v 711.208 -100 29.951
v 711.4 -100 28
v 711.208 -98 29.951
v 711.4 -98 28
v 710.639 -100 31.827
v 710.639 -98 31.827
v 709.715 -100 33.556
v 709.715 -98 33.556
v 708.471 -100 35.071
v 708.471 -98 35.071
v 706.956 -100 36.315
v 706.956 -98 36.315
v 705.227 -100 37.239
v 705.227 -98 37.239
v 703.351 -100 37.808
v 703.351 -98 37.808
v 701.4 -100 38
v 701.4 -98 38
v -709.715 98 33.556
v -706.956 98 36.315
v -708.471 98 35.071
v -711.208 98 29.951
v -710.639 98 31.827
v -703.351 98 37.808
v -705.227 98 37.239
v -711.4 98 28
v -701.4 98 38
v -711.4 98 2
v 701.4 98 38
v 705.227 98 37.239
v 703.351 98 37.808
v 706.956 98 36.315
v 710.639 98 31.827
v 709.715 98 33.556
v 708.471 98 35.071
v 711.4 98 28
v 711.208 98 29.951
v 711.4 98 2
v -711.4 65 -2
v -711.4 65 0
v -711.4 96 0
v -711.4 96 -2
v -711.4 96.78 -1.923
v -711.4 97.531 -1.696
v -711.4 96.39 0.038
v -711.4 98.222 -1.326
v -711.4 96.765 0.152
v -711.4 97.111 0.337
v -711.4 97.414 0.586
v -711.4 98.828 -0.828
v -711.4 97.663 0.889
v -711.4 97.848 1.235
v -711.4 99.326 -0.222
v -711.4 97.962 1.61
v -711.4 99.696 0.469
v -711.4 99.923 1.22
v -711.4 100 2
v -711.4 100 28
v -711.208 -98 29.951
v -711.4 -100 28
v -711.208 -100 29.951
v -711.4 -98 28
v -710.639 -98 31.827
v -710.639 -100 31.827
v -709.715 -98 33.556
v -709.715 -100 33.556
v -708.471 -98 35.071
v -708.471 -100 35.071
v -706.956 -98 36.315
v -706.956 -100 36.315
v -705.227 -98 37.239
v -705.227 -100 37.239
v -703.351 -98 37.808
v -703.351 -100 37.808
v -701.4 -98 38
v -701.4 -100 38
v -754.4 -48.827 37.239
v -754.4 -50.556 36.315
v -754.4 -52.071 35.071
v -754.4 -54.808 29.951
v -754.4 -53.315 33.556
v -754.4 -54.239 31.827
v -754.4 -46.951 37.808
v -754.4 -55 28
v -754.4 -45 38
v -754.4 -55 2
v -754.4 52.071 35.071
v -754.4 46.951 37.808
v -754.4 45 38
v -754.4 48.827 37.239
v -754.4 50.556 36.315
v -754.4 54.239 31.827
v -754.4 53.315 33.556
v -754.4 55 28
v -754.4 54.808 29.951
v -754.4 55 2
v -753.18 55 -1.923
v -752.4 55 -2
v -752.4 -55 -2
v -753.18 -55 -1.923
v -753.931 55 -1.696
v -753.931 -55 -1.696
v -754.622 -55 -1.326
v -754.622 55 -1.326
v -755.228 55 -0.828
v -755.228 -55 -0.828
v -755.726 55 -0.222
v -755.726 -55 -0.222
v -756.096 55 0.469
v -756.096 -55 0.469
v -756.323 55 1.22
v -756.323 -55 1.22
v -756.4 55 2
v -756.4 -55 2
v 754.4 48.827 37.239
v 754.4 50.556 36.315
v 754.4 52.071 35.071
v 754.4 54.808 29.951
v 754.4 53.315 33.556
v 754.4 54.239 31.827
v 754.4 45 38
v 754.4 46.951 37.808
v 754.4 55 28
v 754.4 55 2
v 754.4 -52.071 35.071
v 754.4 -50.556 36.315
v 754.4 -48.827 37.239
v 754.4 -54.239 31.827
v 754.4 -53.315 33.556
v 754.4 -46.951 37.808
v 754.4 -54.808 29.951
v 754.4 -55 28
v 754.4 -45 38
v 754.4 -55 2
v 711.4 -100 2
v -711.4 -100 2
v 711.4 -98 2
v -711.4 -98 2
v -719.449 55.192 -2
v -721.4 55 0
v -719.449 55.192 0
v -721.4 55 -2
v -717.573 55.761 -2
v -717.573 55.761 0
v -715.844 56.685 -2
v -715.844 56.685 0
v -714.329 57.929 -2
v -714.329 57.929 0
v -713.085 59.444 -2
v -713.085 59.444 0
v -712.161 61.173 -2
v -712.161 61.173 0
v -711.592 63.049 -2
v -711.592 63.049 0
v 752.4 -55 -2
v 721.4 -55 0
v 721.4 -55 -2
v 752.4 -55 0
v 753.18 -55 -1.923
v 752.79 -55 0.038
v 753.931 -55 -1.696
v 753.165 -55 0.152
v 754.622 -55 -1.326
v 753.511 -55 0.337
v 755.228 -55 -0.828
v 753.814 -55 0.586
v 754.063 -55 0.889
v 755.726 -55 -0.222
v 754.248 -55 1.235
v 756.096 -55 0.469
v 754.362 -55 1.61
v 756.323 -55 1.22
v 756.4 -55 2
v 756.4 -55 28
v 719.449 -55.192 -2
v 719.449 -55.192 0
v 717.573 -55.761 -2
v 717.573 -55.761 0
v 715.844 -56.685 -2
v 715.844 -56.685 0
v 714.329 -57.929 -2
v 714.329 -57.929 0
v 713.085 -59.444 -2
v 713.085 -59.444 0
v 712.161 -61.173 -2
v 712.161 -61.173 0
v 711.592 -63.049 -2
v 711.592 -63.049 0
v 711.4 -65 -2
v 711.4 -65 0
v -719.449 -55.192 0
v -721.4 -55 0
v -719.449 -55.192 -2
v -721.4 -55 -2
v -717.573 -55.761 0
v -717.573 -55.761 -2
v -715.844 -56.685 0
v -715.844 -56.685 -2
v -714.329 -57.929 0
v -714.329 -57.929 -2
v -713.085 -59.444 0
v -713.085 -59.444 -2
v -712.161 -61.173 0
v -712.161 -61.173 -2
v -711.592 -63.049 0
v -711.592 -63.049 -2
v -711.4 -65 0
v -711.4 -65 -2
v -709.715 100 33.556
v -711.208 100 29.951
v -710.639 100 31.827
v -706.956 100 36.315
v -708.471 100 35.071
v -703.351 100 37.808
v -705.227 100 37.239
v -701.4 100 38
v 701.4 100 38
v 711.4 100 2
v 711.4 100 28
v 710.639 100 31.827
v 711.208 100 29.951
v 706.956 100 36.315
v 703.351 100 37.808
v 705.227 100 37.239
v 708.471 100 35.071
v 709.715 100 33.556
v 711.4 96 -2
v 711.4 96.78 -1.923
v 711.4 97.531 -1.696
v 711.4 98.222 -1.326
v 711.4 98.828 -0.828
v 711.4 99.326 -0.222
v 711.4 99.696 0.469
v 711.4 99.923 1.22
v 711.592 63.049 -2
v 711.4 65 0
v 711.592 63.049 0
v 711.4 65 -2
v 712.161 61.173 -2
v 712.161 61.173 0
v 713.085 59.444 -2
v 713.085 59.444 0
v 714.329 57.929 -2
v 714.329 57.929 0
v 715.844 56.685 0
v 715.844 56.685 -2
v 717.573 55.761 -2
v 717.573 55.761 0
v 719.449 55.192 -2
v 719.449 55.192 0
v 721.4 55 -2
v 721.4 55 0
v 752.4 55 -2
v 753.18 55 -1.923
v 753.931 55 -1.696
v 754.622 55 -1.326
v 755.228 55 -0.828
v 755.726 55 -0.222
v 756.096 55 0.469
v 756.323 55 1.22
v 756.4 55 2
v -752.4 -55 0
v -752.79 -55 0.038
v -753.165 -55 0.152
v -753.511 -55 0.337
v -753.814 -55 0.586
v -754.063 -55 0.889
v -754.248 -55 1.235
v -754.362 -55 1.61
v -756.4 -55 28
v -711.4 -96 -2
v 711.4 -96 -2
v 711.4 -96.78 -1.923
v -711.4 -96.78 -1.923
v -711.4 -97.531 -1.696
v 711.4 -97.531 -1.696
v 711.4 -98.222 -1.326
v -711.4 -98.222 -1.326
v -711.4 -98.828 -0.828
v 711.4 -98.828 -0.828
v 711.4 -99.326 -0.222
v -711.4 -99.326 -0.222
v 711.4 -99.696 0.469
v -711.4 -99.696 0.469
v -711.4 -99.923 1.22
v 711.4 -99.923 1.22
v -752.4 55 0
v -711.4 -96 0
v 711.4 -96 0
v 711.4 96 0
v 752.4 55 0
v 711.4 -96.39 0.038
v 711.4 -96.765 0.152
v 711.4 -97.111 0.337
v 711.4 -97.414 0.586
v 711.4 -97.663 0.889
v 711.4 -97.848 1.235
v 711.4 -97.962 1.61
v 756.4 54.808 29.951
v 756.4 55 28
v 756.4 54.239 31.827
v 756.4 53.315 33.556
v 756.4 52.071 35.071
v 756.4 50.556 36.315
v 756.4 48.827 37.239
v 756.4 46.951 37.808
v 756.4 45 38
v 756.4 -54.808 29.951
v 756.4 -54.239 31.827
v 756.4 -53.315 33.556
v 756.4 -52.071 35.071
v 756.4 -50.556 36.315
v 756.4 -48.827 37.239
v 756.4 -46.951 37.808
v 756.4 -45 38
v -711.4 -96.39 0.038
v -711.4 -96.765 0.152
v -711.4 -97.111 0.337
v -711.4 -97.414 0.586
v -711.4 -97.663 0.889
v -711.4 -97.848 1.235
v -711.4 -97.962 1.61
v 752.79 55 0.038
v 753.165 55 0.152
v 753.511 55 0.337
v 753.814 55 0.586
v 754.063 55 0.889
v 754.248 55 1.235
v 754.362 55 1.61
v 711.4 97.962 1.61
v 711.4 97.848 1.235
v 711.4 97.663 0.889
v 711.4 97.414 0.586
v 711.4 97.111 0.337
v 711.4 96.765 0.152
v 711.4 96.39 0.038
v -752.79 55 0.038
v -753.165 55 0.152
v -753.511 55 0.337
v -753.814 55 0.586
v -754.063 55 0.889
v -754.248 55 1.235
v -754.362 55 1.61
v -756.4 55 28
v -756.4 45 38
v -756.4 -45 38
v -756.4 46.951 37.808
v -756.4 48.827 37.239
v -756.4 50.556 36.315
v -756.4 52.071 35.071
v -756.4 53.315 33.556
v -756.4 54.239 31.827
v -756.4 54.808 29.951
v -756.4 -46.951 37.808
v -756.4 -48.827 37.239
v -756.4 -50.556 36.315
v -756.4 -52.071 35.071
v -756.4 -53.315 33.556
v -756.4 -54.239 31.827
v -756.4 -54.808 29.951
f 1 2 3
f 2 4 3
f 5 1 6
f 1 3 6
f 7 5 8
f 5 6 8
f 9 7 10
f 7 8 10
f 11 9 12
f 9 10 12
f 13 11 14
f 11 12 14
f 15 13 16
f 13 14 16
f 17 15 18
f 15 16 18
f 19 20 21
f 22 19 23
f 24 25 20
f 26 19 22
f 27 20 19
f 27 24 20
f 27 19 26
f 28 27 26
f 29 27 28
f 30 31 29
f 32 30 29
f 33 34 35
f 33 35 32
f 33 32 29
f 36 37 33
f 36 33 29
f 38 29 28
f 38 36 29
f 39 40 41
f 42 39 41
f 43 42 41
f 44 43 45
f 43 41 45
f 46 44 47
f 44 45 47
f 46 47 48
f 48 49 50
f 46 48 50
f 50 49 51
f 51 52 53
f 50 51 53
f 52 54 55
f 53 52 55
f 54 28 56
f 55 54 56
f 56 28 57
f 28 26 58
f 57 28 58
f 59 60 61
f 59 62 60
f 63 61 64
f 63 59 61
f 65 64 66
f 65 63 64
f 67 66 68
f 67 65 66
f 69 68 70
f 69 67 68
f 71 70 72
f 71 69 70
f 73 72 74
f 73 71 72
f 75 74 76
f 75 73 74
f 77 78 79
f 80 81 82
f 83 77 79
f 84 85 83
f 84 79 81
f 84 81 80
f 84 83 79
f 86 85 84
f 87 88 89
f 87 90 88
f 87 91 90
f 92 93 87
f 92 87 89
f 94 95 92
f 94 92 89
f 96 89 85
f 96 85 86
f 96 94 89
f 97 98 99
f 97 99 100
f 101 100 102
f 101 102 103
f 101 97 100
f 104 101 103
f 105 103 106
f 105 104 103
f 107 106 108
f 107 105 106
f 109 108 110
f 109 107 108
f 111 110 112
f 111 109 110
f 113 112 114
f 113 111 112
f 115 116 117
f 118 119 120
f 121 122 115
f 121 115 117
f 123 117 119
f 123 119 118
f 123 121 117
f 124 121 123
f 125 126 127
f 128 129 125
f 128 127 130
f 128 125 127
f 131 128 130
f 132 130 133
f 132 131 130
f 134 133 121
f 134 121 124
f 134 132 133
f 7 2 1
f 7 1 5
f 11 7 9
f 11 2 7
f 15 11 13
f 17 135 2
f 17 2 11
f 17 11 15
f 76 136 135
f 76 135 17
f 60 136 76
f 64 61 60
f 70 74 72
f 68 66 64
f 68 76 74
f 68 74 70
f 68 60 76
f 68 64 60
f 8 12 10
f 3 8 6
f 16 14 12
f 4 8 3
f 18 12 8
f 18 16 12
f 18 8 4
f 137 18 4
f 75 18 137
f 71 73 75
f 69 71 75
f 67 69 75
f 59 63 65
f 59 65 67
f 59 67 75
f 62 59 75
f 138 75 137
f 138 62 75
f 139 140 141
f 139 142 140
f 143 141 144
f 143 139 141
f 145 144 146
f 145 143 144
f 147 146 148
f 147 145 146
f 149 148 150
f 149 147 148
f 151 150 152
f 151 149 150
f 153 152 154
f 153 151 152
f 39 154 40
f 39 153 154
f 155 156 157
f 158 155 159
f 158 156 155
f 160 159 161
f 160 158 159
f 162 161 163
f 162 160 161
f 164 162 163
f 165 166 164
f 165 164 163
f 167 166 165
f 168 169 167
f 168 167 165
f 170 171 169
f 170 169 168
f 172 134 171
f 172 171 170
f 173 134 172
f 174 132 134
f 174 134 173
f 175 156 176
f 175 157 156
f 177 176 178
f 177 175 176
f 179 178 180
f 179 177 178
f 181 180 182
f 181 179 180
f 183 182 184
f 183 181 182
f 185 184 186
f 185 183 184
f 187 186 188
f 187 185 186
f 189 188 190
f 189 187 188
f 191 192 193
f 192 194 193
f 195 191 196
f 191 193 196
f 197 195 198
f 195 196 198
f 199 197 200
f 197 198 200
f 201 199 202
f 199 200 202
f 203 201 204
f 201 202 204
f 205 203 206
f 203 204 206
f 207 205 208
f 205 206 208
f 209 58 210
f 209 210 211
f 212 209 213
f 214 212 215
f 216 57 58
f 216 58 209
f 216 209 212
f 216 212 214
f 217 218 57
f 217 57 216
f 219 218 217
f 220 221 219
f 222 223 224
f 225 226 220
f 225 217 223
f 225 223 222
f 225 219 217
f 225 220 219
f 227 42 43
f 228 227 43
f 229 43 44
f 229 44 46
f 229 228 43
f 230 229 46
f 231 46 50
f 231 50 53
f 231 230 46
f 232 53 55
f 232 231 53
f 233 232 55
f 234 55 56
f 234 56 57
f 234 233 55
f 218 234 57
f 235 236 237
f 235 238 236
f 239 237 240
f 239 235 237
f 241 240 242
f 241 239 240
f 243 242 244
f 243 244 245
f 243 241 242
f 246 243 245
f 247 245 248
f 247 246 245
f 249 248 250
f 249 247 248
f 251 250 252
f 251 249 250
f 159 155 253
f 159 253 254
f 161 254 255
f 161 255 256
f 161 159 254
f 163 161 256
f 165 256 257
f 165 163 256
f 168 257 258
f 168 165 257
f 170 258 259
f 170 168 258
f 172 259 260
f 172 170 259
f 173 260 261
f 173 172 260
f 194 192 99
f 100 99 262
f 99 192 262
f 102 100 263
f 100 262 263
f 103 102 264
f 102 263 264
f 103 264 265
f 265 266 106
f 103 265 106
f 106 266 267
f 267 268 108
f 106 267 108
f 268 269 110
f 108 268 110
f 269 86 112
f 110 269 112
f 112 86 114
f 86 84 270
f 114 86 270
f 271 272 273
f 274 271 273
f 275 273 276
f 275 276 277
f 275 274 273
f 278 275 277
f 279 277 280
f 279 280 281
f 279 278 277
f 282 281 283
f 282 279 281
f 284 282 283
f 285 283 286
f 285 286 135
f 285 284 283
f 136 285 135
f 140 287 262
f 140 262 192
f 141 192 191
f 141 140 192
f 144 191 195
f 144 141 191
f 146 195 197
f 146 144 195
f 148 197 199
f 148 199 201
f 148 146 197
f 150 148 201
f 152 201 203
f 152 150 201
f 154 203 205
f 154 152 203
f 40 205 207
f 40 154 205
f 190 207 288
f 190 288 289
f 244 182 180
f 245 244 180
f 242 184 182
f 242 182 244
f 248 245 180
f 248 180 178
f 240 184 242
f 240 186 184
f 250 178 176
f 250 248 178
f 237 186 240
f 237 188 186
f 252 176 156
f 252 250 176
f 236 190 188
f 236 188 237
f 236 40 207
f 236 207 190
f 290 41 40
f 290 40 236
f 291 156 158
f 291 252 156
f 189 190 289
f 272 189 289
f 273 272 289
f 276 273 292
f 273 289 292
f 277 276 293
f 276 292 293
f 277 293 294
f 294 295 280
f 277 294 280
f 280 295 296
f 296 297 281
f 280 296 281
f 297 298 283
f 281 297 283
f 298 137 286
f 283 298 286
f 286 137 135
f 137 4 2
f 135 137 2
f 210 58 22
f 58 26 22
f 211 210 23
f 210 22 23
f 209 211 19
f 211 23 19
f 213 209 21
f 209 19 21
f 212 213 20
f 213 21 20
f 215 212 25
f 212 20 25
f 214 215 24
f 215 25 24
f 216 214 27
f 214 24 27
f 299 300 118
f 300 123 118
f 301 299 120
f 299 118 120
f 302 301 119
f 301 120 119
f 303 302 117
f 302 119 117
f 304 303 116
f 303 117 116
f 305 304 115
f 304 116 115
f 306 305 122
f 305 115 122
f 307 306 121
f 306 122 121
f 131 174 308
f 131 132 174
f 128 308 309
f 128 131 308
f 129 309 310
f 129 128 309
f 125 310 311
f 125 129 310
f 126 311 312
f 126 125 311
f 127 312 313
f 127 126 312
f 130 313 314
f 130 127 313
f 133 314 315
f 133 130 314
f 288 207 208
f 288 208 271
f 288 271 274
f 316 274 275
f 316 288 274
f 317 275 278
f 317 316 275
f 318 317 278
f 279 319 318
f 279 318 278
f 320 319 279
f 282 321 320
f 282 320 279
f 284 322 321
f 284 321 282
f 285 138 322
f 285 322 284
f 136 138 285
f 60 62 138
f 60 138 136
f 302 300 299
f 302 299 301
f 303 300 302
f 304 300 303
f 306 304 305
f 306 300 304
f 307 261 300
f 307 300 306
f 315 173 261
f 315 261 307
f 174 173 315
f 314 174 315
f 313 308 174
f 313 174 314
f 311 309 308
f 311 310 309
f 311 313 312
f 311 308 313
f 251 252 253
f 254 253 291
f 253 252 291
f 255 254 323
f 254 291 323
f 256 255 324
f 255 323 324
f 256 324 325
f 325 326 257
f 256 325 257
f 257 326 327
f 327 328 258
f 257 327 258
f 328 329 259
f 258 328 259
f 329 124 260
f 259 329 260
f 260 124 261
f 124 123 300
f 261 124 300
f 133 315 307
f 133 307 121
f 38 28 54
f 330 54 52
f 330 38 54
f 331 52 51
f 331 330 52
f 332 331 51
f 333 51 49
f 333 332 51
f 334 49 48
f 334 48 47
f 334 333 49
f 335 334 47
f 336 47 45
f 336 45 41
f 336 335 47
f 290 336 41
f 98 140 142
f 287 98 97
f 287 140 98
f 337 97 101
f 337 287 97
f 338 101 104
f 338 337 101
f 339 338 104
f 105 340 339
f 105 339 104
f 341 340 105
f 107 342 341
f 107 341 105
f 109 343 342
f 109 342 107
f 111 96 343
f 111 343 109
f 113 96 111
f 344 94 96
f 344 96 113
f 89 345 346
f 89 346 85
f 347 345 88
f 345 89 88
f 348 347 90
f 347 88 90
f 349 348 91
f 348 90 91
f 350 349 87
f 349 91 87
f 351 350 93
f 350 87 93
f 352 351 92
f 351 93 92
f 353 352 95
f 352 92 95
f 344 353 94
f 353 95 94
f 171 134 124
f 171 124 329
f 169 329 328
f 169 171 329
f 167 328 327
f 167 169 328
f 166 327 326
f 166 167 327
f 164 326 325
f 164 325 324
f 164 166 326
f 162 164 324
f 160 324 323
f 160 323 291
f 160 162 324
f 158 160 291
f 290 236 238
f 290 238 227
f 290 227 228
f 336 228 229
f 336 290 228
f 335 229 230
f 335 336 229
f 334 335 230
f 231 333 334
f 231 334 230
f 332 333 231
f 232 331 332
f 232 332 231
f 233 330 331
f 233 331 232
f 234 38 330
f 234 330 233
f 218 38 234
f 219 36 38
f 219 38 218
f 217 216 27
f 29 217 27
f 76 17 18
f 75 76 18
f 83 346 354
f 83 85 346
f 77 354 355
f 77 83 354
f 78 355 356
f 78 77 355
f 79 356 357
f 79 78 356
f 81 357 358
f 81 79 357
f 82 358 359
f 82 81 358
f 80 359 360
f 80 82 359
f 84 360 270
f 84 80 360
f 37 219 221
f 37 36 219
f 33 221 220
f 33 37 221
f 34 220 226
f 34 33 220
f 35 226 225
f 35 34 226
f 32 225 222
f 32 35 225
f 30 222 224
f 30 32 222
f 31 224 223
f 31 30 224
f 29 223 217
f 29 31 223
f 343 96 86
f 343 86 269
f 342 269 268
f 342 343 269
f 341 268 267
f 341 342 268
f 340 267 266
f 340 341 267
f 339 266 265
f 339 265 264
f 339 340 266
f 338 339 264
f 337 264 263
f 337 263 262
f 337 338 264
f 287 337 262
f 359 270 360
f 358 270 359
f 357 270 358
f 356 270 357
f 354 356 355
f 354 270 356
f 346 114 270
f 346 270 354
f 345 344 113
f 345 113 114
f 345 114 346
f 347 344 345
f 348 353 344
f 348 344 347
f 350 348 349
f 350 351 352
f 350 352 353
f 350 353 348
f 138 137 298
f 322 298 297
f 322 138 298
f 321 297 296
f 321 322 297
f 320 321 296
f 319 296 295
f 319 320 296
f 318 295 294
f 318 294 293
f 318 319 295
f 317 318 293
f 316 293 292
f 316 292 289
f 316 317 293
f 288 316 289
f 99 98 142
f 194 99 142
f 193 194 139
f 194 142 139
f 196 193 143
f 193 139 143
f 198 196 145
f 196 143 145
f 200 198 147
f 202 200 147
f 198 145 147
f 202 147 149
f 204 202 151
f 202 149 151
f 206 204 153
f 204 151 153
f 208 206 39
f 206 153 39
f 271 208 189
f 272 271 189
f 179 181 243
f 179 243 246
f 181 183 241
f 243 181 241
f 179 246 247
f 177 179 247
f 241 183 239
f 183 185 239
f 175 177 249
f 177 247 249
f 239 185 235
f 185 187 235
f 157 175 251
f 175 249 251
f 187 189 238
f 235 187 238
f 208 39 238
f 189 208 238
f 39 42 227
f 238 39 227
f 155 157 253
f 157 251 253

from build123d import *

# Parameters (mm, degrees)
BASE_FLANGE1_DEPTH             = 2
EDGE_FLANGE1_STRIP_W           = 12
EDGE_FLANGE1_STRIP_H           = 2
EDGE_FLANGE1_STRIP_CUT_DEPTH   = 1422.8
EDGE_FLANGE1_STRIP_2_W         = 12
EDGE_FLANGE1_STRIP_2_H         = 2
EDGE_FLANGE1_STRIP_CUT_2_DEPTH = 110
EDGE_FLANGE1_STRIP_3_W         = 12
EDGE_FLANGE1_STRIP_3_H         = 2
EDGE_FLANGE1_STRIP_CUT_3_DEPTH = 1422.8
EDGE_FLANGE1_STRIP_4_W         = 12
EDGE_FLANGE1_STRIP_4_H         = 2
EDGE_FLANGE1_STRIP_CUT_4_DEPTH = 110
EDGE_FLANGE1_DEPTH             = 1422.8
EDGE_FLANGE1_BEND_DEPTH        = 110
EDGE_FLANGE1_BEND_2_DEPTH      = 1422.8
EDGE_FLANGE1_BEND_3_DEPTH      = 110
FILLET1_R                      = 10


# Sheet-metal steps are written as plain solids
with BuildPart() as part:
    # Sketch1 → Base-Flange1 (new body)
    with BuildSketch(Plane.XY):
        Polygon((-711.4, -100), (711.4, -100), (711.4, -55), (756.4, -55), (756.4, 55), (711.4, 55), (711.4, 100), (-711.4, 100), (-711.4, 55), (-756.4, 55), (-756.4, -55), (-711.4, -55), align=None)
    extrude(amount=-BASE_FLANGE1_DEPTH)

    # Edge-Flange1 strip (across the edge) → Edge-Flange1 strip cut (cut)
    with BuildSketch(Plane(origin=(711.4, 100, 0), x_dir=(0, -1, 0), z_dir=(-1, 0, 0))):
        with Locations((-2, -1)):
            Rectangle(EDGE_FLANGE1_STRIP_W, EDGE_FLANGE1_STRIP_H)
    extrude(amount=EDGE_FLANGE1_STRIP_CUT_DEPTH, mode=Mode.SUBTRACT)

    # Edge-Flange1 strip 2 (across the edge) → Edge-Flange1 strip cut 2 (cut)
    with BuildSketch(Plane(origin=(756.4, -55, 0), x_dir=(-1, 0, 0), z_dir=(0, 1, 0))):
        with Locations((-2, -1)):
            Rectangle(EDGE_FLANGE1_STRIP_2_W, EDGE_FLANGE1_STRIP_2_H)
    extrude(amount=EDGE_FLANGE1_STRIP_CUT_2_DEPTH, mode=Mode.SUBTRACT)

    # Edge-Flange1 strip 3 (across the edge) → Edge-Flange1 strip cut 3 (cut)
    with BuildSketch(Plane(origin=(-711.4, -100, 0), x_dir=(0, 1, 0), z_dir=(1, 0, 0))):
        with Locations((-2, -1)):
            Rectangle(EDGE_FLANGE1_STRIP_3_W, EDGE_FLANGE1_STRIP_3_H)
    extrude(amount=EDGE_FLANGE1_STRIP_CUT_3_DEPTH, mode=Mode.SUBTRACT)

    # Edge-Flange1 strip 4 (across the edge) → Edge-Flange1 strip cut 4 (cut)
    with BuildSketch(Plane(origin=(-756.4, 55, 0), x_dir=(1, 0, 0), z_dir=(0, -1, 0))):
        with Locations((-2, -1)):
            Rectangle(EDGE_FLANGE1_STRIP_4_W, EDGE_FLANGE1_STRIP_4_H)
    extrude(amount=EDGE_FLANGE1_STRIP_CUT_4_DEPTH, mode=Mode.SUBTRACT)

    # Edge-Flange1 section (across the edge) → Edge-Flange1 (add)
    with BuildSketch(Plane(origin=(711.4, 100, 0), x_dir=(0, -1, 0), z_dir=(-1, 0, 0))):
        with BuildLine():
            Line((0, 2), (0, 38))
            Line((0, 38), (2, 38))
            Line((2, 38), (2, 2))
            ThreePointArc((2, 2), (2.585786438, 0.585786438), (4, 0))
            Line((4, 0), (4, -2))
            ThreePointArc((4, -2), (1.171572875, -0.828427125), (0, 2))
        make_face()
    extrude(amount=EDGE_FLANGE1_DEPTH)

    # Edge-Flange1 section 2 (across the edge) → Edge-Flange1 bend (add)
    with BuildSketch(Plane(origin=(756.4, -55, 0), x_dir=(-1, 0, 0), z_dir=(0, 1, 0))):
        with BuildLine():
            Line((0, 2), (0, 38))
            Line((0, 38), (2, 38))
            Line((2, 38), (2, 2))
            ThreePointArc((2, 2), (2.585786438, 0.585786438), (4, 0))
            Line((4, 0), (4, -2))
            ThreePointArc((4, -2), (1.171572875, -0.828427125), (0, 2))
        make_face()
    extrude(amount=EDGE_FLANGE1_BEND_DEPTH)

    # Edge-Flange1 section 3 (across the edge) → Edge-Flange1 bend 2 (add)
    with BuildSketch(Plane(origin=(-711.4, -100, 0), x_dir=(0, 1, 0), z_dir=(1, 0, 0))):
        with BuildLine():
            Line((0, 2), (0, 38))
            Line((0, 38), (2, 38))
            Line((2, 38), (2, 2))
            ThreePointArc((2, 2), (2.585786438, 0.585786438), (4, 0))
            Line((4, 0), (4, -2))
            ThreePointArc((4, -2), (1.171572875, -0.828427125), (0, 2))
        make_face()
    extrude(amount=EDGE_FLANGE1_BEND_2_DEPTH)

    # Edge-Flange1 section 4 (across the edge) → Edge-Flange1 bend 3 (add)
    with BuildSketch(Plane(origin=(-756.4, 55, 0), x_dir=(1, 0, 0), z_dir=(0, -1, 0))):
        with BuildLine():
            Line((0, 2), (0, 38))
            Line((0, 38), (2, 38))
            Line((2, 38), (2, 2))
            ThreePointArc((2, 2), (2.585786438, 0.585786438), (4, 0))
            Line((4, 0), (4, -2))
            ThreePointArc((4, -2), (1.171572875, -0.828427125), (0, 2))
        make_face()
    extrude(amount=EDGE_FLANGE1_BEND_3_DEPTH)

    # Fillet1
    fillet1_edges = [part.edges().sort_by_distance(p)[0] for p in [
        (755.4, -55, 38),
        (755.4, 55, 38),
        (-711.4, -99, 38),
        (711.4, -99, 38),
        (-755.4, 55, 38),
        (-755.4, -55, 38),
        (711.4, 55, -1),
        (711.4, -55, -1),
        (-711.4, -55, -1),
        (-711.4, 55, -1),
        (711.4, 99, 38),
        (-711.4, 99, 38),
    ]]
    fillet(fillet1_edges, radius=FILLET1_R)


solid = part.part
